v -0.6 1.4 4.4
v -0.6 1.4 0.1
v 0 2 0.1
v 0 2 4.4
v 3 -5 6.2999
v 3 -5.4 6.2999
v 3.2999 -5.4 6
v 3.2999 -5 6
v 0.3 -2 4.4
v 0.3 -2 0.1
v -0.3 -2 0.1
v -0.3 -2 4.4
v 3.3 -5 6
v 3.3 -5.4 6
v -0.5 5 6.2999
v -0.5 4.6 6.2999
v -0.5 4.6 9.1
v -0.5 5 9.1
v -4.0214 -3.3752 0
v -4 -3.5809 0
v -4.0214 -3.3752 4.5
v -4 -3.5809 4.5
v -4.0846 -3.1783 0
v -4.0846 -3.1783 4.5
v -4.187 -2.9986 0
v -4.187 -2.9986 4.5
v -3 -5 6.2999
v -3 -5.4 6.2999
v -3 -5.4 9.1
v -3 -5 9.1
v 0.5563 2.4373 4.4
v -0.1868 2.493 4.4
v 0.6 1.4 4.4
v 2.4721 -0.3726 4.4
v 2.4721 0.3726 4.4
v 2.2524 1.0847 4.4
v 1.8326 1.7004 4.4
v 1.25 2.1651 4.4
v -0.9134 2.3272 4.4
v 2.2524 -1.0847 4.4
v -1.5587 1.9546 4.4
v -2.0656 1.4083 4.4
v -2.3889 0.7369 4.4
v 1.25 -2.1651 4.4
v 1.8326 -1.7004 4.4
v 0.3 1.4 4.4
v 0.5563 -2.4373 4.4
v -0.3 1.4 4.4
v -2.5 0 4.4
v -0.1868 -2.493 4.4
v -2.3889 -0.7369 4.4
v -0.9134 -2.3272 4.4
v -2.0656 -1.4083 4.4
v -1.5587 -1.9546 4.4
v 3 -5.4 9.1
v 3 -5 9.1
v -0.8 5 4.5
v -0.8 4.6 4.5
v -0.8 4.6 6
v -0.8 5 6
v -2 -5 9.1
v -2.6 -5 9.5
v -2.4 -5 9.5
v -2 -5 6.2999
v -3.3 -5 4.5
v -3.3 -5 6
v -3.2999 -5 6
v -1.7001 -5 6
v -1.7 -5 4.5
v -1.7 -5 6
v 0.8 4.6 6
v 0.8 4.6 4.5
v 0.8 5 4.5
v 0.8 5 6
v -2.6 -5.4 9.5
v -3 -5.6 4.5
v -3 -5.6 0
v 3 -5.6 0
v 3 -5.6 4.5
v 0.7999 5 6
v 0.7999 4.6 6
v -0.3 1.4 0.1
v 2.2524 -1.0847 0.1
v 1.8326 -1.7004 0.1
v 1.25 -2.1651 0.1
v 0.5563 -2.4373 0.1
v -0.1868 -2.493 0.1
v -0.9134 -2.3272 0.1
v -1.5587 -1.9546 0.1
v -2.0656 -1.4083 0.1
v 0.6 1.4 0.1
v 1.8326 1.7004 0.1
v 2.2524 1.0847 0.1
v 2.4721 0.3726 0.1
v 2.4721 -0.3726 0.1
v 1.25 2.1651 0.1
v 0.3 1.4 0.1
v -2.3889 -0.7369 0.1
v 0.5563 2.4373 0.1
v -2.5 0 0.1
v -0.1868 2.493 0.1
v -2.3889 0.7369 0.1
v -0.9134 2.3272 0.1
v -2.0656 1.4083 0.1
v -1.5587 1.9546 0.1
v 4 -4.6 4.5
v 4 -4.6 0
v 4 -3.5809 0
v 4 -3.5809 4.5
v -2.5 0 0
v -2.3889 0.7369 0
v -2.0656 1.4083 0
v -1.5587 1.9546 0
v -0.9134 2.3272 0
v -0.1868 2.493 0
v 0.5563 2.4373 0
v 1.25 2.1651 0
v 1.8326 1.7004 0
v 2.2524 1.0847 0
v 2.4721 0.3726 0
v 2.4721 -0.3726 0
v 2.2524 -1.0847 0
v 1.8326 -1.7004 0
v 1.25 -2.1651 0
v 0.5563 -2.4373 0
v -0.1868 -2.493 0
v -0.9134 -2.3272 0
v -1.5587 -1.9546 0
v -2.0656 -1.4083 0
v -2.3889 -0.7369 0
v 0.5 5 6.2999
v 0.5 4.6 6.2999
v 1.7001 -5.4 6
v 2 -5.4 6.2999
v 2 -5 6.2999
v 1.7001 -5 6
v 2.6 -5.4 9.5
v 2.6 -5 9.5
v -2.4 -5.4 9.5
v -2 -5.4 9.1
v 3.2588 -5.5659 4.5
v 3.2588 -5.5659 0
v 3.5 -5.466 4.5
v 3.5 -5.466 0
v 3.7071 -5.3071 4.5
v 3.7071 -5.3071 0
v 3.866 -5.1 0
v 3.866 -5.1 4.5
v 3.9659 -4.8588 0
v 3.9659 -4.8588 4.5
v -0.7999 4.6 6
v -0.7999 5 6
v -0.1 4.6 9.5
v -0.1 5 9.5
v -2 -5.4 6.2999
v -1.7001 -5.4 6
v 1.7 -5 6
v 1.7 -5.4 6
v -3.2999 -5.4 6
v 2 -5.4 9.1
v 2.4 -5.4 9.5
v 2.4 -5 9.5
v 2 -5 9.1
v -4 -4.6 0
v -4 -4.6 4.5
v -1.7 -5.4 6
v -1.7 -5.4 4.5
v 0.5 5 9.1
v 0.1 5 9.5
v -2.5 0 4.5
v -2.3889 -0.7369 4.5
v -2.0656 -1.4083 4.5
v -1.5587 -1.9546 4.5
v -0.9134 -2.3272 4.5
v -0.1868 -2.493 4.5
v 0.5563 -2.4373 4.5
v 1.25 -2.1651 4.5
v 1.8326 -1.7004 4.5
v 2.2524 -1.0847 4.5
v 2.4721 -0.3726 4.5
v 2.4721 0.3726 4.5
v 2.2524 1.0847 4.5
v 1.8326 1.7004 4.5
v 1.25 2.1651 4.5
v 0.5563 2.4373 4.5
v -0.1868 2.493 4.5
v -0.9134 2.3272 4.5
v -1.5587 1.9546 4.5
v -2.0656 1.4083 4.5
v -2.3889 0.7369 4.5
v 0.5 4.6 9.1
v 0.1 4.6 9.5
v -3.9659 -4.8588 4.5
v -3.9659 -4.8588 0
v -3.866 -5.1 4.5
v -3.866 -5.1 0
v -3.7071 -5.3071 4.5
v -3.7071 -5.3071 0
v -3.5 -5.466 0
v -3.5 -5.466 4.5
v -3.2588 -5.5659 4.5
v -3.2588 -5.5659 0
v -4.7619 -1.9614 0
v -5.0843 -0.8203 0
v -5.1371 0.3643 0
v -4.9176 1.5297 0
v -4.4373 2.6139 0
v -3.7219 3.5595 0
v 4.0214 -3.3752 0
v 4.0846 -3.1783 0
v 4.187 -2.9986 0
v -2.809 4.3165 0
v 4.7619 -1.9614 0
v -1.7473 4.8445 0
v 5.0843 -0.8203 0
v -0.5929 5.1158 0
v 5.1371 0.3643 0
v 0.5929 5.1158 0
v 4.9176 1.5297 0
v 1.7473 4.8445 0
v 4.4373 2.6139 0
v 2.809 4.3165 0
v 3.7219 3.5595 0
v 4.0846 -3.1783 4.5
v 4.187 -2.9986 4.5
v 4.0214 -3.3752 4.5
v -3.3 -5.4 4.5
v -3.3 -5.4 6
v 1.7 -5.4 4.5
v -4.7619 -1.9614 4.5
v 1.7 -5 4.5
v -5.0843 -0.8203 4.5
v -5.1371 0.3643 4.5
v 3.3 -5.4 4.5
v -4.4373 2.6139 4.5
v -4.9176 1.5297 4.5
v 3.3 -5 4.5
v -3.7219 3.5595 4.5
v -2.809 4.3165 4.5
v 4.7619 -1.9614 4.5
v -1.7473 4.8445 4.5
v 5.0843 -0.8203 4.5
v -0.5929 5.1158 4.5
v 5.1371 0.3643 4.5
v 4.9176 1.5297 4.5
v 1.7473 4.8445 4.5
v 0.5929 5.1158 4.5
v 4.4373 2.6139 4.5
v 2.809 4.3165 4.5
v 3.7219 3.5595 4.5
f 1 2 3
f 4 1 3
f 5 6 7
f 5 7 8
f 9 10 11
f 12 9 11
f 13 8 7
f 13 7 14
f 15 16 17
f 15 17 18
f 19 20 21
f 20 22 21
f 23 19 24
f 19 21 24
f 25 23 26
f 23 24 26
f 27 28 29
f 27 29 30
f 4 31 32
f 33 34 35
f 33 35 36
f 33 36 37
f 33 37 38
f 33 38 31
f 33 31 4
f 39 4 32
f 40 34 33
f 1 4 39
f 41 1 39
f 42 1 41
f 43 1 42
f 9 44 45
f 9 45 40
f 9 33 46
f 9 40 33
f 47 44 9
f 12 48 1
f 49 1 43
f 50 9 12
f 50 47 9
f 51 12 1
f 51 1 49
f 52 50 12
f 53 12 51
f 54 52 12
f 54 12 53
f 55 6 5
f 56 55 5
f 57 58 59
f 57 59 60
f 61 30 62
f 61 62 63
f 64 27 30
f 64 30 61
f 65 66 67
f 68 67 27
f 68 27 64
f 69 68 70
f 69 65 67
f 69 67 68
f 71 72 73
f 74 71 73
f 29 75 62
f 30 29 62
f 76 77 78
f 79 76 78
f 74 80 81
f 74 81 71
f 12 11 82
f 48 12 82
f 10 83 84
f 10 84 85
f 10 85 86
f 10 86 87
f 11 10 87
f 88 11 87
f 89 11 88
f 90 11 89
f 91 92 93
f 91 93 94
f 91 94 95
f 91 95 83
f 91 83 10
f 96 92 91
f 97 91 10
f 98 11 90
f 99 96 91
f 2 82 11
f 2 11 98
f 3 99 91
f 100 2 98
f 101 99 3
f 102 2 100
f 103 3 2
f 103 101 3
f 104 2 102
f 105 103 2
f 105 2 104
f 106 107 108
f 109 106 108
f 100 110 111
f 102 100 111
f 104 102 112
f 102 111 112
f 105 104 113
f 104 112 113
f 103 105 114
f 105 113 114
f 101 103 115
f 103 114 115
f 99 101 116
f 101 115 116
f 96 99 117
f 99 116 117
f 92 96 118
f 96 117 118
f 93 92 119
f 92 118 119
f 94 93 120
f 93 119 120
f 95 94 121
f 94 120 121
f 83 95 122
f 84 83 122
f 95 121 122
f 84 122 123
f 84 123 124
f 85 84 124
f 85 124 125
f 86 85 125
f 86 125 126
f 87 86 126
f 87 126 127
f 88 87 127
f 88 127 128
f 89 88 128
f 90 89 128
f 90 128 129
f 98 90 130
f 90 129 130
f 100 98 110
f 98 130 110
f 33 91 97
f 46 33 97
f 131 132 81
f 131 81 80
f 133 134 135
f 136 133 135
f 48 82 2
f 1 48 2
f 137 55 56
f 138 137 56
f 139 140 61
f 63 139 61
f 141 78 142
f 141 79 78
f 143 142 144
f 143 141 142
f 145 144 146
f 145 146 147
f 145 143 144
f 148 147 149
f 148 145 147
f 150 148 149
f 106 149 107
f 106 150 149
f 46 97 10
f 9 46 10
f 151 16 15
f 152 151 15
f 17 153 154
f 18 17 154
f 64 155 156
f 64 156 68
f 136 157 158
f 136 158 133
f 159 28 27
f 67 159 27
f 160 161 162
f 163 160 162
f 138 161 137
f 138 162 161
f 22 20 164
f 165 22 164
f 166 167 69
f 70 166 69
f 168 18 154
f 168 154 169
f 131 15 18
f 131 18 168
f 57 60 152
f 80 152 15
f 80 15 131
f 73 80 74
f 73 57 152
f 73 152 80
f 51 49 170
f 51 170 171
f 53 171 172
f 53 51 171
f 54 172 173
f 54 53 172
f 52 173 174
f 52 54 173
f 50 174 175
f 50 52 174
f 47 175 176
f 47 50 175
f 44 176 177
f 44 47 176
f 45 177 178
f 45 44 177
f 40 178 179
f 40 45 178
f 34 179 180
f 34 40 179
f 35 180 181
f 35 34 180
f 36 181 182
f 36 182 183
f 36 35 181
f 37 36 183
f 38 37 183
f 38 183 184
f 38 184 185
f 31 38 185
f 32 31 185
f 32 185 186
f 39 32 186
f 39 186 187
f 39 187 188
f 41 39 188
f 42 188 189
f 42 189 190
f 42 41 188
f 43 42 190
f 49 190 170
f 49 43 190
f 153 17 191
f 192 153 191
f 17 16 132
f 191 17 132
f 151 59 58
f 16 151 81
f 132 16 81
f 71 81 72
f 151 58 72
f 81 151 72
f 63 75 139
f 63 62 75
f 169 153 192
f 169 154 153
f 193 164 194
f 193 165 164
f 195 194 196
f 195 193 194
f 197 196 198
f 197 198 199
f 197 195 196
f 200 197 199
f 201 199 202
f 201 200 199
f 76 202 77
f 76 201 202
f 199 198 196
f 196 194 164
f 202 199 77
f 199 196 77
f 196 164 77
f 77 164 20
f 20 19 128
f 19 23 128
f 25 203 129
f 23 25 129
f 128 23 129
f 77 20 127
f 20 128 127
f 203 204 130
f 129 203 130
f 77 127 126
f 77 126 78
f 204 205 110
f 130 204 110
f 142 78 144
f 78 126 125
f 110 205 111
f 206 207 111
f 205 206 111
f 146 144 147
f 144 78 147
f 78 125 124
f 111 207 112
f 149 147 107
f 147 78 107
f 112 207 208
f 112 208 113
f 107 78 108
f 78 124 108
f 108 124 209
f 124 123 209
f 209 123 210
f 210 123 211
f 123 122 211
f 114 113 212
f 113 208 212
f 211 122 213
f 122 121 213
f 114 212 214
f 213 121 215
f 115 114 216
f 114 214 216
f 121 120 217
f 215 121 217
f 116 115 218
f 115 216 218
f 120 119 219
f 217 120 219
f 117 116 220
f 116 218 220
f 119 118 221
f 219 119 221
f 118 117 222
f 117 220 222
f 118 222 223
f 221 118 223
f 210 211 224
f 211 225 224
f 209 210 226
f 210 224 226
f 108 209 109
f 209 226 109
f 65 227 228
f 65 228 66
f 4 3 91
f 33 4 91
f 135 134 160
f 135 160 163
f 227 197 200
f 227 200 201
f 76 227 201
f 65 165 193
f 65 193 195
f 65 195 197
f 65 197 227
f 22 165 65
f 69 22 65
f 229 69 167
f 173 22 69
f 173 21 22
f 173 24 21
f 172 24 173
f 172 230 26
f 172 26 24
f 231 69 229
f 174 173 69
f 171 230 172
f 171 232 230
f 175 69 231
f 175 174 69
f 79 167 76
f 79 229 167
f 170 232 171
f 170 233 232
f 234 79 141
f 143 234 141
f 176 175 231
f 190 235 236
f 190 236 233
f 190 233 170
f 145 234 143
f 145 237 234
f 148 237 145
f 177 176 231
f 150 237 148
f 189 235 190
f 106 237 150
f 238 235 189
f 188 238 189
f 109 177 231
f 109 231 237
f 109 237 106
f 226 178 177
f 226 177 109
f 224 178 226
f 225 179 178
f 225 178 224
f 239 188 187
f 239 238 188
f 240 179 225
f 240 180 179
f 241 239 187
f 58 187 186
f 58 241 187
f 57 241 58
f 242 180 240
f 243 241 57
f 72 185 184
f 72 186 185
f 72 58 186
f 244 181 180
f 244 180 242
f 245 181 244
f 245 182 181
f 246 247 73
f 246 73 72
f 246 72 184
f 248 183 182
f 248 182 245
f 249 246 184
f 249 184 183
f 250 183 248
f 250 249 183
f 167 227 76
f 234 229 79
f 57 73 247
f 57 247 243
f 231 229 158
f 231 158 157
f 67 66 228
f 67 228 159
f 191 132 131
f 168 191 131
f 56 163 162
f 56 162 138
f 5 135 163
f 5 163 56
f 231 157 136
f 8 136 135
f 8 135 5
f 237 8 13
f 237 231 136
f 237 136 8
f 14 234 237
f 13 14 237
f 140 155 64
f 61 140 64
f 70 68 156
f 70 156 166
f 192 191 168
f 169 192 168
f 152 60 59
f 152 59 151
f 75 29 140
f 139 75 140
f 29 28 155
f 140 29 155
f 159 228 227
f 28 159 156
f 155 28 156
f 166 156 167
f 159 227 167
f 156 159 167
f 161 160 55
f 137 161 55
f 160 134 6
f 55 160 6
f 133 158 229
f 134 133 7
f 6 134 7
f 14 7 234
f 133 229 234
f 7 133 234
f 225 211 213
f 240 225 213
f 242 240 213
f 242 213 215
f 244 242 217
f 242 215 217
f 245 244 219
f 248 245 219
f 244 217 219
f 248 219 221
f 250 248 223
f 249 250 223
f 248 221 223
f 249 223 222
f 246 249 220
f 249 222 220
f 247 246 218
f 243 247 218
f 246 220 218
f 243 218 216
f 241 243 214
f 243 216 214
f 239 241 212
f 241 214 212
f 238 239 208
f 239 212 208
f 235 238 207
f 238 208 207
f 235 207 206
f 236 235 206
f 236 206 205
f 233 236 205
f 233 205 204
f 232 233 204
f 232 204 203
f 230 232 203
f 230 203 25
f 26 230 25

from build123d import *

# Parameters (mm, degrees)
BOSS_EXTRU_1_DEPTH      = 4.5
ESQUISSE4_R             = 2.5
ENL_V_MAT_EXTRU_1_DEPTH = 0.1
ENL_V_START             = -0.1
ESQUISSE5_R             = 2.5
ENL_V_MAT_EXTRU_2_DEPTH = 0.1
ENL_V_MAT_EXTRU_3_DEPTH = 9.788771245
CONG_1_R                = 1
ESQUISSE7_W             = 1.6
ESQUISSE7_H             = 0.4
BOSS_EXTRU_4_DEPTH      = 1.5
ESQUISSE8_W             = 1
ESQUISSE8_H             = 0.4
BOSS_EXTRU_5_DEPTH      = 3.5
CHANFREIN3_SIZE         = 0.3
CHANFREIN4_SIZE         = 0.4


with BuildPart() as part:
    # Esquisse1 → Boss.-Extru.1 (new body)
    with BuildSketch(Plane.XY):
        with BuildLine():
            Line((-4, -3.243840317), (-4, -5.6))
            Line((-4, -5.6), (4, -5.6))
            Line((4, -5.6), (4, -3.243840317))
            ThreePointArc((4, -3.243840317), (0, 5.15), (-4, -3.243840317))
        make_face()
    extrude(amount=BOSS_EXTRU_1_DEPTH)

    # Esquisse4 → Enlèv. mat.-Extru.1 (cut)
    with BuildSketch(Plane(origin=(0, 0, 0), x_dir=(-1, 0, 0), z_dir=(0, 0, -1))):
        Circle(ESQUISSE4_R)
    extrude(amount=-ENL_V_MAT_EXTRU_1_DEPTH, mode=Mode.SUBTRACT)

    # Esquisse5 → Enlèv. mat.-Extru.2 (cut)
    with BuildSketch(Plane.XY.offset(4.5).offset(ENL_V_START)):
        with Locations(Location((0, 0, 0), (0, 0, 180))):
            Circle(ESQUISSE5_R)
    extrude(amount=ENL_V_MAT_EXTRU_2_DEPTH, mode=Mode.SUBTRACT)

    # Esquisse6 → Enlèv. mat.-Extru.3 (cut, through all)
    with BuildSketch(Plane(origin=(0, 0, 0.1), x_dir=(-1, 0, 0), z_dir=(0, 0, -1))):
        Polygon((0, 2), (-0.6, 1.4), (-0.3, 1.4), (-0.3, -2), (0.3, -2), (0.3, 1.4), (0.6, 1.4), align=None)
    extrude(amount=-ENL_V_MAT_EXTRU_3_DEPTH, mode=Mode.SUBTRACT)

    # Congé1
    cong_1_edges = [part.edges().sort_by_distance(p)[0] for p in [
        (4, -3.243840317, 2.25),
        (4, -5.6, 2.25),
        (-4, -5.6, 2.25),
        (-4, -3.243840317, 2.25),
    ]]
    fillet(cong_1_edges, radius=CONG_1_R)

    # Esquisse7 → Boss.-Extru.4 (add)
    with BuildSketch(Plane.XY.offset(4.5)):
        with Locations((-2.5, -5.2)):
            Rectangle(ESQUISSE7_W, ESQUISSE7_H)
        with Locations((2.5, -5.2)):
            Rectangle(ESQUISSE7_W, ESQUISSE7_H)
        with Locations((0, 4.8)):
            Rectangle(ESQUISSE7_W, ESQUISSE7_H)
    extrude(amount=BOSS_EXTRU_4_DEPTH)

    # Esquisse8 → Boss.-Extru.5 (add)
    with BuildSketch(Plane.XY.offset(6)):
        with Locations((0, 4.8)):
            Rectangle(ESQUISSE8_W, ESQUISSE8_H)
        with Locations((-2.5, -5.2)):
            Rectangle(ESQUISSE8_W, ESQUISSE8_H)
        with Locations((2.5, -5.2)):
            Rectangle(ESQUISSE8_W, ESQUISSE8_H)
    extrude(amount=BOSS_EXTRU_5_DEPTH)

    # Chanfrein3
    chanfrein3_edges = [part.edges().sort_by_distance(p)[0] for p in [
        (0.5, 4.8, 6),
        (-2, -5.2, 6),
        (3, -5.2, 6),
        (2, -5.2, 6),
        (-3, -5.2, 6),
        (-0.5, 4.8, 6),
    ]]
    chamfer(chanfrein3_edges, length=CHANFREIN3_SIZE - 0.0001)  # a hair under: the kernel refuses the full size

    # Chanfrein4
    chanfrein4_edges = [part.edges().sort_by_distance(p)[0] for p in [
        (-0.5, 4.8, 9.5),
        (0.5, 4.8, 9.5),
        (-3, -5.2, 9.5),
        (-2, -5.2, 9.5),
        (2, -5.2, 9.5),
        (3, -5.2, 9.5),
    ]]
    chamfer(chanfrein4_edges, length=CHANFREIN4_SIZE)


solid = part.part
